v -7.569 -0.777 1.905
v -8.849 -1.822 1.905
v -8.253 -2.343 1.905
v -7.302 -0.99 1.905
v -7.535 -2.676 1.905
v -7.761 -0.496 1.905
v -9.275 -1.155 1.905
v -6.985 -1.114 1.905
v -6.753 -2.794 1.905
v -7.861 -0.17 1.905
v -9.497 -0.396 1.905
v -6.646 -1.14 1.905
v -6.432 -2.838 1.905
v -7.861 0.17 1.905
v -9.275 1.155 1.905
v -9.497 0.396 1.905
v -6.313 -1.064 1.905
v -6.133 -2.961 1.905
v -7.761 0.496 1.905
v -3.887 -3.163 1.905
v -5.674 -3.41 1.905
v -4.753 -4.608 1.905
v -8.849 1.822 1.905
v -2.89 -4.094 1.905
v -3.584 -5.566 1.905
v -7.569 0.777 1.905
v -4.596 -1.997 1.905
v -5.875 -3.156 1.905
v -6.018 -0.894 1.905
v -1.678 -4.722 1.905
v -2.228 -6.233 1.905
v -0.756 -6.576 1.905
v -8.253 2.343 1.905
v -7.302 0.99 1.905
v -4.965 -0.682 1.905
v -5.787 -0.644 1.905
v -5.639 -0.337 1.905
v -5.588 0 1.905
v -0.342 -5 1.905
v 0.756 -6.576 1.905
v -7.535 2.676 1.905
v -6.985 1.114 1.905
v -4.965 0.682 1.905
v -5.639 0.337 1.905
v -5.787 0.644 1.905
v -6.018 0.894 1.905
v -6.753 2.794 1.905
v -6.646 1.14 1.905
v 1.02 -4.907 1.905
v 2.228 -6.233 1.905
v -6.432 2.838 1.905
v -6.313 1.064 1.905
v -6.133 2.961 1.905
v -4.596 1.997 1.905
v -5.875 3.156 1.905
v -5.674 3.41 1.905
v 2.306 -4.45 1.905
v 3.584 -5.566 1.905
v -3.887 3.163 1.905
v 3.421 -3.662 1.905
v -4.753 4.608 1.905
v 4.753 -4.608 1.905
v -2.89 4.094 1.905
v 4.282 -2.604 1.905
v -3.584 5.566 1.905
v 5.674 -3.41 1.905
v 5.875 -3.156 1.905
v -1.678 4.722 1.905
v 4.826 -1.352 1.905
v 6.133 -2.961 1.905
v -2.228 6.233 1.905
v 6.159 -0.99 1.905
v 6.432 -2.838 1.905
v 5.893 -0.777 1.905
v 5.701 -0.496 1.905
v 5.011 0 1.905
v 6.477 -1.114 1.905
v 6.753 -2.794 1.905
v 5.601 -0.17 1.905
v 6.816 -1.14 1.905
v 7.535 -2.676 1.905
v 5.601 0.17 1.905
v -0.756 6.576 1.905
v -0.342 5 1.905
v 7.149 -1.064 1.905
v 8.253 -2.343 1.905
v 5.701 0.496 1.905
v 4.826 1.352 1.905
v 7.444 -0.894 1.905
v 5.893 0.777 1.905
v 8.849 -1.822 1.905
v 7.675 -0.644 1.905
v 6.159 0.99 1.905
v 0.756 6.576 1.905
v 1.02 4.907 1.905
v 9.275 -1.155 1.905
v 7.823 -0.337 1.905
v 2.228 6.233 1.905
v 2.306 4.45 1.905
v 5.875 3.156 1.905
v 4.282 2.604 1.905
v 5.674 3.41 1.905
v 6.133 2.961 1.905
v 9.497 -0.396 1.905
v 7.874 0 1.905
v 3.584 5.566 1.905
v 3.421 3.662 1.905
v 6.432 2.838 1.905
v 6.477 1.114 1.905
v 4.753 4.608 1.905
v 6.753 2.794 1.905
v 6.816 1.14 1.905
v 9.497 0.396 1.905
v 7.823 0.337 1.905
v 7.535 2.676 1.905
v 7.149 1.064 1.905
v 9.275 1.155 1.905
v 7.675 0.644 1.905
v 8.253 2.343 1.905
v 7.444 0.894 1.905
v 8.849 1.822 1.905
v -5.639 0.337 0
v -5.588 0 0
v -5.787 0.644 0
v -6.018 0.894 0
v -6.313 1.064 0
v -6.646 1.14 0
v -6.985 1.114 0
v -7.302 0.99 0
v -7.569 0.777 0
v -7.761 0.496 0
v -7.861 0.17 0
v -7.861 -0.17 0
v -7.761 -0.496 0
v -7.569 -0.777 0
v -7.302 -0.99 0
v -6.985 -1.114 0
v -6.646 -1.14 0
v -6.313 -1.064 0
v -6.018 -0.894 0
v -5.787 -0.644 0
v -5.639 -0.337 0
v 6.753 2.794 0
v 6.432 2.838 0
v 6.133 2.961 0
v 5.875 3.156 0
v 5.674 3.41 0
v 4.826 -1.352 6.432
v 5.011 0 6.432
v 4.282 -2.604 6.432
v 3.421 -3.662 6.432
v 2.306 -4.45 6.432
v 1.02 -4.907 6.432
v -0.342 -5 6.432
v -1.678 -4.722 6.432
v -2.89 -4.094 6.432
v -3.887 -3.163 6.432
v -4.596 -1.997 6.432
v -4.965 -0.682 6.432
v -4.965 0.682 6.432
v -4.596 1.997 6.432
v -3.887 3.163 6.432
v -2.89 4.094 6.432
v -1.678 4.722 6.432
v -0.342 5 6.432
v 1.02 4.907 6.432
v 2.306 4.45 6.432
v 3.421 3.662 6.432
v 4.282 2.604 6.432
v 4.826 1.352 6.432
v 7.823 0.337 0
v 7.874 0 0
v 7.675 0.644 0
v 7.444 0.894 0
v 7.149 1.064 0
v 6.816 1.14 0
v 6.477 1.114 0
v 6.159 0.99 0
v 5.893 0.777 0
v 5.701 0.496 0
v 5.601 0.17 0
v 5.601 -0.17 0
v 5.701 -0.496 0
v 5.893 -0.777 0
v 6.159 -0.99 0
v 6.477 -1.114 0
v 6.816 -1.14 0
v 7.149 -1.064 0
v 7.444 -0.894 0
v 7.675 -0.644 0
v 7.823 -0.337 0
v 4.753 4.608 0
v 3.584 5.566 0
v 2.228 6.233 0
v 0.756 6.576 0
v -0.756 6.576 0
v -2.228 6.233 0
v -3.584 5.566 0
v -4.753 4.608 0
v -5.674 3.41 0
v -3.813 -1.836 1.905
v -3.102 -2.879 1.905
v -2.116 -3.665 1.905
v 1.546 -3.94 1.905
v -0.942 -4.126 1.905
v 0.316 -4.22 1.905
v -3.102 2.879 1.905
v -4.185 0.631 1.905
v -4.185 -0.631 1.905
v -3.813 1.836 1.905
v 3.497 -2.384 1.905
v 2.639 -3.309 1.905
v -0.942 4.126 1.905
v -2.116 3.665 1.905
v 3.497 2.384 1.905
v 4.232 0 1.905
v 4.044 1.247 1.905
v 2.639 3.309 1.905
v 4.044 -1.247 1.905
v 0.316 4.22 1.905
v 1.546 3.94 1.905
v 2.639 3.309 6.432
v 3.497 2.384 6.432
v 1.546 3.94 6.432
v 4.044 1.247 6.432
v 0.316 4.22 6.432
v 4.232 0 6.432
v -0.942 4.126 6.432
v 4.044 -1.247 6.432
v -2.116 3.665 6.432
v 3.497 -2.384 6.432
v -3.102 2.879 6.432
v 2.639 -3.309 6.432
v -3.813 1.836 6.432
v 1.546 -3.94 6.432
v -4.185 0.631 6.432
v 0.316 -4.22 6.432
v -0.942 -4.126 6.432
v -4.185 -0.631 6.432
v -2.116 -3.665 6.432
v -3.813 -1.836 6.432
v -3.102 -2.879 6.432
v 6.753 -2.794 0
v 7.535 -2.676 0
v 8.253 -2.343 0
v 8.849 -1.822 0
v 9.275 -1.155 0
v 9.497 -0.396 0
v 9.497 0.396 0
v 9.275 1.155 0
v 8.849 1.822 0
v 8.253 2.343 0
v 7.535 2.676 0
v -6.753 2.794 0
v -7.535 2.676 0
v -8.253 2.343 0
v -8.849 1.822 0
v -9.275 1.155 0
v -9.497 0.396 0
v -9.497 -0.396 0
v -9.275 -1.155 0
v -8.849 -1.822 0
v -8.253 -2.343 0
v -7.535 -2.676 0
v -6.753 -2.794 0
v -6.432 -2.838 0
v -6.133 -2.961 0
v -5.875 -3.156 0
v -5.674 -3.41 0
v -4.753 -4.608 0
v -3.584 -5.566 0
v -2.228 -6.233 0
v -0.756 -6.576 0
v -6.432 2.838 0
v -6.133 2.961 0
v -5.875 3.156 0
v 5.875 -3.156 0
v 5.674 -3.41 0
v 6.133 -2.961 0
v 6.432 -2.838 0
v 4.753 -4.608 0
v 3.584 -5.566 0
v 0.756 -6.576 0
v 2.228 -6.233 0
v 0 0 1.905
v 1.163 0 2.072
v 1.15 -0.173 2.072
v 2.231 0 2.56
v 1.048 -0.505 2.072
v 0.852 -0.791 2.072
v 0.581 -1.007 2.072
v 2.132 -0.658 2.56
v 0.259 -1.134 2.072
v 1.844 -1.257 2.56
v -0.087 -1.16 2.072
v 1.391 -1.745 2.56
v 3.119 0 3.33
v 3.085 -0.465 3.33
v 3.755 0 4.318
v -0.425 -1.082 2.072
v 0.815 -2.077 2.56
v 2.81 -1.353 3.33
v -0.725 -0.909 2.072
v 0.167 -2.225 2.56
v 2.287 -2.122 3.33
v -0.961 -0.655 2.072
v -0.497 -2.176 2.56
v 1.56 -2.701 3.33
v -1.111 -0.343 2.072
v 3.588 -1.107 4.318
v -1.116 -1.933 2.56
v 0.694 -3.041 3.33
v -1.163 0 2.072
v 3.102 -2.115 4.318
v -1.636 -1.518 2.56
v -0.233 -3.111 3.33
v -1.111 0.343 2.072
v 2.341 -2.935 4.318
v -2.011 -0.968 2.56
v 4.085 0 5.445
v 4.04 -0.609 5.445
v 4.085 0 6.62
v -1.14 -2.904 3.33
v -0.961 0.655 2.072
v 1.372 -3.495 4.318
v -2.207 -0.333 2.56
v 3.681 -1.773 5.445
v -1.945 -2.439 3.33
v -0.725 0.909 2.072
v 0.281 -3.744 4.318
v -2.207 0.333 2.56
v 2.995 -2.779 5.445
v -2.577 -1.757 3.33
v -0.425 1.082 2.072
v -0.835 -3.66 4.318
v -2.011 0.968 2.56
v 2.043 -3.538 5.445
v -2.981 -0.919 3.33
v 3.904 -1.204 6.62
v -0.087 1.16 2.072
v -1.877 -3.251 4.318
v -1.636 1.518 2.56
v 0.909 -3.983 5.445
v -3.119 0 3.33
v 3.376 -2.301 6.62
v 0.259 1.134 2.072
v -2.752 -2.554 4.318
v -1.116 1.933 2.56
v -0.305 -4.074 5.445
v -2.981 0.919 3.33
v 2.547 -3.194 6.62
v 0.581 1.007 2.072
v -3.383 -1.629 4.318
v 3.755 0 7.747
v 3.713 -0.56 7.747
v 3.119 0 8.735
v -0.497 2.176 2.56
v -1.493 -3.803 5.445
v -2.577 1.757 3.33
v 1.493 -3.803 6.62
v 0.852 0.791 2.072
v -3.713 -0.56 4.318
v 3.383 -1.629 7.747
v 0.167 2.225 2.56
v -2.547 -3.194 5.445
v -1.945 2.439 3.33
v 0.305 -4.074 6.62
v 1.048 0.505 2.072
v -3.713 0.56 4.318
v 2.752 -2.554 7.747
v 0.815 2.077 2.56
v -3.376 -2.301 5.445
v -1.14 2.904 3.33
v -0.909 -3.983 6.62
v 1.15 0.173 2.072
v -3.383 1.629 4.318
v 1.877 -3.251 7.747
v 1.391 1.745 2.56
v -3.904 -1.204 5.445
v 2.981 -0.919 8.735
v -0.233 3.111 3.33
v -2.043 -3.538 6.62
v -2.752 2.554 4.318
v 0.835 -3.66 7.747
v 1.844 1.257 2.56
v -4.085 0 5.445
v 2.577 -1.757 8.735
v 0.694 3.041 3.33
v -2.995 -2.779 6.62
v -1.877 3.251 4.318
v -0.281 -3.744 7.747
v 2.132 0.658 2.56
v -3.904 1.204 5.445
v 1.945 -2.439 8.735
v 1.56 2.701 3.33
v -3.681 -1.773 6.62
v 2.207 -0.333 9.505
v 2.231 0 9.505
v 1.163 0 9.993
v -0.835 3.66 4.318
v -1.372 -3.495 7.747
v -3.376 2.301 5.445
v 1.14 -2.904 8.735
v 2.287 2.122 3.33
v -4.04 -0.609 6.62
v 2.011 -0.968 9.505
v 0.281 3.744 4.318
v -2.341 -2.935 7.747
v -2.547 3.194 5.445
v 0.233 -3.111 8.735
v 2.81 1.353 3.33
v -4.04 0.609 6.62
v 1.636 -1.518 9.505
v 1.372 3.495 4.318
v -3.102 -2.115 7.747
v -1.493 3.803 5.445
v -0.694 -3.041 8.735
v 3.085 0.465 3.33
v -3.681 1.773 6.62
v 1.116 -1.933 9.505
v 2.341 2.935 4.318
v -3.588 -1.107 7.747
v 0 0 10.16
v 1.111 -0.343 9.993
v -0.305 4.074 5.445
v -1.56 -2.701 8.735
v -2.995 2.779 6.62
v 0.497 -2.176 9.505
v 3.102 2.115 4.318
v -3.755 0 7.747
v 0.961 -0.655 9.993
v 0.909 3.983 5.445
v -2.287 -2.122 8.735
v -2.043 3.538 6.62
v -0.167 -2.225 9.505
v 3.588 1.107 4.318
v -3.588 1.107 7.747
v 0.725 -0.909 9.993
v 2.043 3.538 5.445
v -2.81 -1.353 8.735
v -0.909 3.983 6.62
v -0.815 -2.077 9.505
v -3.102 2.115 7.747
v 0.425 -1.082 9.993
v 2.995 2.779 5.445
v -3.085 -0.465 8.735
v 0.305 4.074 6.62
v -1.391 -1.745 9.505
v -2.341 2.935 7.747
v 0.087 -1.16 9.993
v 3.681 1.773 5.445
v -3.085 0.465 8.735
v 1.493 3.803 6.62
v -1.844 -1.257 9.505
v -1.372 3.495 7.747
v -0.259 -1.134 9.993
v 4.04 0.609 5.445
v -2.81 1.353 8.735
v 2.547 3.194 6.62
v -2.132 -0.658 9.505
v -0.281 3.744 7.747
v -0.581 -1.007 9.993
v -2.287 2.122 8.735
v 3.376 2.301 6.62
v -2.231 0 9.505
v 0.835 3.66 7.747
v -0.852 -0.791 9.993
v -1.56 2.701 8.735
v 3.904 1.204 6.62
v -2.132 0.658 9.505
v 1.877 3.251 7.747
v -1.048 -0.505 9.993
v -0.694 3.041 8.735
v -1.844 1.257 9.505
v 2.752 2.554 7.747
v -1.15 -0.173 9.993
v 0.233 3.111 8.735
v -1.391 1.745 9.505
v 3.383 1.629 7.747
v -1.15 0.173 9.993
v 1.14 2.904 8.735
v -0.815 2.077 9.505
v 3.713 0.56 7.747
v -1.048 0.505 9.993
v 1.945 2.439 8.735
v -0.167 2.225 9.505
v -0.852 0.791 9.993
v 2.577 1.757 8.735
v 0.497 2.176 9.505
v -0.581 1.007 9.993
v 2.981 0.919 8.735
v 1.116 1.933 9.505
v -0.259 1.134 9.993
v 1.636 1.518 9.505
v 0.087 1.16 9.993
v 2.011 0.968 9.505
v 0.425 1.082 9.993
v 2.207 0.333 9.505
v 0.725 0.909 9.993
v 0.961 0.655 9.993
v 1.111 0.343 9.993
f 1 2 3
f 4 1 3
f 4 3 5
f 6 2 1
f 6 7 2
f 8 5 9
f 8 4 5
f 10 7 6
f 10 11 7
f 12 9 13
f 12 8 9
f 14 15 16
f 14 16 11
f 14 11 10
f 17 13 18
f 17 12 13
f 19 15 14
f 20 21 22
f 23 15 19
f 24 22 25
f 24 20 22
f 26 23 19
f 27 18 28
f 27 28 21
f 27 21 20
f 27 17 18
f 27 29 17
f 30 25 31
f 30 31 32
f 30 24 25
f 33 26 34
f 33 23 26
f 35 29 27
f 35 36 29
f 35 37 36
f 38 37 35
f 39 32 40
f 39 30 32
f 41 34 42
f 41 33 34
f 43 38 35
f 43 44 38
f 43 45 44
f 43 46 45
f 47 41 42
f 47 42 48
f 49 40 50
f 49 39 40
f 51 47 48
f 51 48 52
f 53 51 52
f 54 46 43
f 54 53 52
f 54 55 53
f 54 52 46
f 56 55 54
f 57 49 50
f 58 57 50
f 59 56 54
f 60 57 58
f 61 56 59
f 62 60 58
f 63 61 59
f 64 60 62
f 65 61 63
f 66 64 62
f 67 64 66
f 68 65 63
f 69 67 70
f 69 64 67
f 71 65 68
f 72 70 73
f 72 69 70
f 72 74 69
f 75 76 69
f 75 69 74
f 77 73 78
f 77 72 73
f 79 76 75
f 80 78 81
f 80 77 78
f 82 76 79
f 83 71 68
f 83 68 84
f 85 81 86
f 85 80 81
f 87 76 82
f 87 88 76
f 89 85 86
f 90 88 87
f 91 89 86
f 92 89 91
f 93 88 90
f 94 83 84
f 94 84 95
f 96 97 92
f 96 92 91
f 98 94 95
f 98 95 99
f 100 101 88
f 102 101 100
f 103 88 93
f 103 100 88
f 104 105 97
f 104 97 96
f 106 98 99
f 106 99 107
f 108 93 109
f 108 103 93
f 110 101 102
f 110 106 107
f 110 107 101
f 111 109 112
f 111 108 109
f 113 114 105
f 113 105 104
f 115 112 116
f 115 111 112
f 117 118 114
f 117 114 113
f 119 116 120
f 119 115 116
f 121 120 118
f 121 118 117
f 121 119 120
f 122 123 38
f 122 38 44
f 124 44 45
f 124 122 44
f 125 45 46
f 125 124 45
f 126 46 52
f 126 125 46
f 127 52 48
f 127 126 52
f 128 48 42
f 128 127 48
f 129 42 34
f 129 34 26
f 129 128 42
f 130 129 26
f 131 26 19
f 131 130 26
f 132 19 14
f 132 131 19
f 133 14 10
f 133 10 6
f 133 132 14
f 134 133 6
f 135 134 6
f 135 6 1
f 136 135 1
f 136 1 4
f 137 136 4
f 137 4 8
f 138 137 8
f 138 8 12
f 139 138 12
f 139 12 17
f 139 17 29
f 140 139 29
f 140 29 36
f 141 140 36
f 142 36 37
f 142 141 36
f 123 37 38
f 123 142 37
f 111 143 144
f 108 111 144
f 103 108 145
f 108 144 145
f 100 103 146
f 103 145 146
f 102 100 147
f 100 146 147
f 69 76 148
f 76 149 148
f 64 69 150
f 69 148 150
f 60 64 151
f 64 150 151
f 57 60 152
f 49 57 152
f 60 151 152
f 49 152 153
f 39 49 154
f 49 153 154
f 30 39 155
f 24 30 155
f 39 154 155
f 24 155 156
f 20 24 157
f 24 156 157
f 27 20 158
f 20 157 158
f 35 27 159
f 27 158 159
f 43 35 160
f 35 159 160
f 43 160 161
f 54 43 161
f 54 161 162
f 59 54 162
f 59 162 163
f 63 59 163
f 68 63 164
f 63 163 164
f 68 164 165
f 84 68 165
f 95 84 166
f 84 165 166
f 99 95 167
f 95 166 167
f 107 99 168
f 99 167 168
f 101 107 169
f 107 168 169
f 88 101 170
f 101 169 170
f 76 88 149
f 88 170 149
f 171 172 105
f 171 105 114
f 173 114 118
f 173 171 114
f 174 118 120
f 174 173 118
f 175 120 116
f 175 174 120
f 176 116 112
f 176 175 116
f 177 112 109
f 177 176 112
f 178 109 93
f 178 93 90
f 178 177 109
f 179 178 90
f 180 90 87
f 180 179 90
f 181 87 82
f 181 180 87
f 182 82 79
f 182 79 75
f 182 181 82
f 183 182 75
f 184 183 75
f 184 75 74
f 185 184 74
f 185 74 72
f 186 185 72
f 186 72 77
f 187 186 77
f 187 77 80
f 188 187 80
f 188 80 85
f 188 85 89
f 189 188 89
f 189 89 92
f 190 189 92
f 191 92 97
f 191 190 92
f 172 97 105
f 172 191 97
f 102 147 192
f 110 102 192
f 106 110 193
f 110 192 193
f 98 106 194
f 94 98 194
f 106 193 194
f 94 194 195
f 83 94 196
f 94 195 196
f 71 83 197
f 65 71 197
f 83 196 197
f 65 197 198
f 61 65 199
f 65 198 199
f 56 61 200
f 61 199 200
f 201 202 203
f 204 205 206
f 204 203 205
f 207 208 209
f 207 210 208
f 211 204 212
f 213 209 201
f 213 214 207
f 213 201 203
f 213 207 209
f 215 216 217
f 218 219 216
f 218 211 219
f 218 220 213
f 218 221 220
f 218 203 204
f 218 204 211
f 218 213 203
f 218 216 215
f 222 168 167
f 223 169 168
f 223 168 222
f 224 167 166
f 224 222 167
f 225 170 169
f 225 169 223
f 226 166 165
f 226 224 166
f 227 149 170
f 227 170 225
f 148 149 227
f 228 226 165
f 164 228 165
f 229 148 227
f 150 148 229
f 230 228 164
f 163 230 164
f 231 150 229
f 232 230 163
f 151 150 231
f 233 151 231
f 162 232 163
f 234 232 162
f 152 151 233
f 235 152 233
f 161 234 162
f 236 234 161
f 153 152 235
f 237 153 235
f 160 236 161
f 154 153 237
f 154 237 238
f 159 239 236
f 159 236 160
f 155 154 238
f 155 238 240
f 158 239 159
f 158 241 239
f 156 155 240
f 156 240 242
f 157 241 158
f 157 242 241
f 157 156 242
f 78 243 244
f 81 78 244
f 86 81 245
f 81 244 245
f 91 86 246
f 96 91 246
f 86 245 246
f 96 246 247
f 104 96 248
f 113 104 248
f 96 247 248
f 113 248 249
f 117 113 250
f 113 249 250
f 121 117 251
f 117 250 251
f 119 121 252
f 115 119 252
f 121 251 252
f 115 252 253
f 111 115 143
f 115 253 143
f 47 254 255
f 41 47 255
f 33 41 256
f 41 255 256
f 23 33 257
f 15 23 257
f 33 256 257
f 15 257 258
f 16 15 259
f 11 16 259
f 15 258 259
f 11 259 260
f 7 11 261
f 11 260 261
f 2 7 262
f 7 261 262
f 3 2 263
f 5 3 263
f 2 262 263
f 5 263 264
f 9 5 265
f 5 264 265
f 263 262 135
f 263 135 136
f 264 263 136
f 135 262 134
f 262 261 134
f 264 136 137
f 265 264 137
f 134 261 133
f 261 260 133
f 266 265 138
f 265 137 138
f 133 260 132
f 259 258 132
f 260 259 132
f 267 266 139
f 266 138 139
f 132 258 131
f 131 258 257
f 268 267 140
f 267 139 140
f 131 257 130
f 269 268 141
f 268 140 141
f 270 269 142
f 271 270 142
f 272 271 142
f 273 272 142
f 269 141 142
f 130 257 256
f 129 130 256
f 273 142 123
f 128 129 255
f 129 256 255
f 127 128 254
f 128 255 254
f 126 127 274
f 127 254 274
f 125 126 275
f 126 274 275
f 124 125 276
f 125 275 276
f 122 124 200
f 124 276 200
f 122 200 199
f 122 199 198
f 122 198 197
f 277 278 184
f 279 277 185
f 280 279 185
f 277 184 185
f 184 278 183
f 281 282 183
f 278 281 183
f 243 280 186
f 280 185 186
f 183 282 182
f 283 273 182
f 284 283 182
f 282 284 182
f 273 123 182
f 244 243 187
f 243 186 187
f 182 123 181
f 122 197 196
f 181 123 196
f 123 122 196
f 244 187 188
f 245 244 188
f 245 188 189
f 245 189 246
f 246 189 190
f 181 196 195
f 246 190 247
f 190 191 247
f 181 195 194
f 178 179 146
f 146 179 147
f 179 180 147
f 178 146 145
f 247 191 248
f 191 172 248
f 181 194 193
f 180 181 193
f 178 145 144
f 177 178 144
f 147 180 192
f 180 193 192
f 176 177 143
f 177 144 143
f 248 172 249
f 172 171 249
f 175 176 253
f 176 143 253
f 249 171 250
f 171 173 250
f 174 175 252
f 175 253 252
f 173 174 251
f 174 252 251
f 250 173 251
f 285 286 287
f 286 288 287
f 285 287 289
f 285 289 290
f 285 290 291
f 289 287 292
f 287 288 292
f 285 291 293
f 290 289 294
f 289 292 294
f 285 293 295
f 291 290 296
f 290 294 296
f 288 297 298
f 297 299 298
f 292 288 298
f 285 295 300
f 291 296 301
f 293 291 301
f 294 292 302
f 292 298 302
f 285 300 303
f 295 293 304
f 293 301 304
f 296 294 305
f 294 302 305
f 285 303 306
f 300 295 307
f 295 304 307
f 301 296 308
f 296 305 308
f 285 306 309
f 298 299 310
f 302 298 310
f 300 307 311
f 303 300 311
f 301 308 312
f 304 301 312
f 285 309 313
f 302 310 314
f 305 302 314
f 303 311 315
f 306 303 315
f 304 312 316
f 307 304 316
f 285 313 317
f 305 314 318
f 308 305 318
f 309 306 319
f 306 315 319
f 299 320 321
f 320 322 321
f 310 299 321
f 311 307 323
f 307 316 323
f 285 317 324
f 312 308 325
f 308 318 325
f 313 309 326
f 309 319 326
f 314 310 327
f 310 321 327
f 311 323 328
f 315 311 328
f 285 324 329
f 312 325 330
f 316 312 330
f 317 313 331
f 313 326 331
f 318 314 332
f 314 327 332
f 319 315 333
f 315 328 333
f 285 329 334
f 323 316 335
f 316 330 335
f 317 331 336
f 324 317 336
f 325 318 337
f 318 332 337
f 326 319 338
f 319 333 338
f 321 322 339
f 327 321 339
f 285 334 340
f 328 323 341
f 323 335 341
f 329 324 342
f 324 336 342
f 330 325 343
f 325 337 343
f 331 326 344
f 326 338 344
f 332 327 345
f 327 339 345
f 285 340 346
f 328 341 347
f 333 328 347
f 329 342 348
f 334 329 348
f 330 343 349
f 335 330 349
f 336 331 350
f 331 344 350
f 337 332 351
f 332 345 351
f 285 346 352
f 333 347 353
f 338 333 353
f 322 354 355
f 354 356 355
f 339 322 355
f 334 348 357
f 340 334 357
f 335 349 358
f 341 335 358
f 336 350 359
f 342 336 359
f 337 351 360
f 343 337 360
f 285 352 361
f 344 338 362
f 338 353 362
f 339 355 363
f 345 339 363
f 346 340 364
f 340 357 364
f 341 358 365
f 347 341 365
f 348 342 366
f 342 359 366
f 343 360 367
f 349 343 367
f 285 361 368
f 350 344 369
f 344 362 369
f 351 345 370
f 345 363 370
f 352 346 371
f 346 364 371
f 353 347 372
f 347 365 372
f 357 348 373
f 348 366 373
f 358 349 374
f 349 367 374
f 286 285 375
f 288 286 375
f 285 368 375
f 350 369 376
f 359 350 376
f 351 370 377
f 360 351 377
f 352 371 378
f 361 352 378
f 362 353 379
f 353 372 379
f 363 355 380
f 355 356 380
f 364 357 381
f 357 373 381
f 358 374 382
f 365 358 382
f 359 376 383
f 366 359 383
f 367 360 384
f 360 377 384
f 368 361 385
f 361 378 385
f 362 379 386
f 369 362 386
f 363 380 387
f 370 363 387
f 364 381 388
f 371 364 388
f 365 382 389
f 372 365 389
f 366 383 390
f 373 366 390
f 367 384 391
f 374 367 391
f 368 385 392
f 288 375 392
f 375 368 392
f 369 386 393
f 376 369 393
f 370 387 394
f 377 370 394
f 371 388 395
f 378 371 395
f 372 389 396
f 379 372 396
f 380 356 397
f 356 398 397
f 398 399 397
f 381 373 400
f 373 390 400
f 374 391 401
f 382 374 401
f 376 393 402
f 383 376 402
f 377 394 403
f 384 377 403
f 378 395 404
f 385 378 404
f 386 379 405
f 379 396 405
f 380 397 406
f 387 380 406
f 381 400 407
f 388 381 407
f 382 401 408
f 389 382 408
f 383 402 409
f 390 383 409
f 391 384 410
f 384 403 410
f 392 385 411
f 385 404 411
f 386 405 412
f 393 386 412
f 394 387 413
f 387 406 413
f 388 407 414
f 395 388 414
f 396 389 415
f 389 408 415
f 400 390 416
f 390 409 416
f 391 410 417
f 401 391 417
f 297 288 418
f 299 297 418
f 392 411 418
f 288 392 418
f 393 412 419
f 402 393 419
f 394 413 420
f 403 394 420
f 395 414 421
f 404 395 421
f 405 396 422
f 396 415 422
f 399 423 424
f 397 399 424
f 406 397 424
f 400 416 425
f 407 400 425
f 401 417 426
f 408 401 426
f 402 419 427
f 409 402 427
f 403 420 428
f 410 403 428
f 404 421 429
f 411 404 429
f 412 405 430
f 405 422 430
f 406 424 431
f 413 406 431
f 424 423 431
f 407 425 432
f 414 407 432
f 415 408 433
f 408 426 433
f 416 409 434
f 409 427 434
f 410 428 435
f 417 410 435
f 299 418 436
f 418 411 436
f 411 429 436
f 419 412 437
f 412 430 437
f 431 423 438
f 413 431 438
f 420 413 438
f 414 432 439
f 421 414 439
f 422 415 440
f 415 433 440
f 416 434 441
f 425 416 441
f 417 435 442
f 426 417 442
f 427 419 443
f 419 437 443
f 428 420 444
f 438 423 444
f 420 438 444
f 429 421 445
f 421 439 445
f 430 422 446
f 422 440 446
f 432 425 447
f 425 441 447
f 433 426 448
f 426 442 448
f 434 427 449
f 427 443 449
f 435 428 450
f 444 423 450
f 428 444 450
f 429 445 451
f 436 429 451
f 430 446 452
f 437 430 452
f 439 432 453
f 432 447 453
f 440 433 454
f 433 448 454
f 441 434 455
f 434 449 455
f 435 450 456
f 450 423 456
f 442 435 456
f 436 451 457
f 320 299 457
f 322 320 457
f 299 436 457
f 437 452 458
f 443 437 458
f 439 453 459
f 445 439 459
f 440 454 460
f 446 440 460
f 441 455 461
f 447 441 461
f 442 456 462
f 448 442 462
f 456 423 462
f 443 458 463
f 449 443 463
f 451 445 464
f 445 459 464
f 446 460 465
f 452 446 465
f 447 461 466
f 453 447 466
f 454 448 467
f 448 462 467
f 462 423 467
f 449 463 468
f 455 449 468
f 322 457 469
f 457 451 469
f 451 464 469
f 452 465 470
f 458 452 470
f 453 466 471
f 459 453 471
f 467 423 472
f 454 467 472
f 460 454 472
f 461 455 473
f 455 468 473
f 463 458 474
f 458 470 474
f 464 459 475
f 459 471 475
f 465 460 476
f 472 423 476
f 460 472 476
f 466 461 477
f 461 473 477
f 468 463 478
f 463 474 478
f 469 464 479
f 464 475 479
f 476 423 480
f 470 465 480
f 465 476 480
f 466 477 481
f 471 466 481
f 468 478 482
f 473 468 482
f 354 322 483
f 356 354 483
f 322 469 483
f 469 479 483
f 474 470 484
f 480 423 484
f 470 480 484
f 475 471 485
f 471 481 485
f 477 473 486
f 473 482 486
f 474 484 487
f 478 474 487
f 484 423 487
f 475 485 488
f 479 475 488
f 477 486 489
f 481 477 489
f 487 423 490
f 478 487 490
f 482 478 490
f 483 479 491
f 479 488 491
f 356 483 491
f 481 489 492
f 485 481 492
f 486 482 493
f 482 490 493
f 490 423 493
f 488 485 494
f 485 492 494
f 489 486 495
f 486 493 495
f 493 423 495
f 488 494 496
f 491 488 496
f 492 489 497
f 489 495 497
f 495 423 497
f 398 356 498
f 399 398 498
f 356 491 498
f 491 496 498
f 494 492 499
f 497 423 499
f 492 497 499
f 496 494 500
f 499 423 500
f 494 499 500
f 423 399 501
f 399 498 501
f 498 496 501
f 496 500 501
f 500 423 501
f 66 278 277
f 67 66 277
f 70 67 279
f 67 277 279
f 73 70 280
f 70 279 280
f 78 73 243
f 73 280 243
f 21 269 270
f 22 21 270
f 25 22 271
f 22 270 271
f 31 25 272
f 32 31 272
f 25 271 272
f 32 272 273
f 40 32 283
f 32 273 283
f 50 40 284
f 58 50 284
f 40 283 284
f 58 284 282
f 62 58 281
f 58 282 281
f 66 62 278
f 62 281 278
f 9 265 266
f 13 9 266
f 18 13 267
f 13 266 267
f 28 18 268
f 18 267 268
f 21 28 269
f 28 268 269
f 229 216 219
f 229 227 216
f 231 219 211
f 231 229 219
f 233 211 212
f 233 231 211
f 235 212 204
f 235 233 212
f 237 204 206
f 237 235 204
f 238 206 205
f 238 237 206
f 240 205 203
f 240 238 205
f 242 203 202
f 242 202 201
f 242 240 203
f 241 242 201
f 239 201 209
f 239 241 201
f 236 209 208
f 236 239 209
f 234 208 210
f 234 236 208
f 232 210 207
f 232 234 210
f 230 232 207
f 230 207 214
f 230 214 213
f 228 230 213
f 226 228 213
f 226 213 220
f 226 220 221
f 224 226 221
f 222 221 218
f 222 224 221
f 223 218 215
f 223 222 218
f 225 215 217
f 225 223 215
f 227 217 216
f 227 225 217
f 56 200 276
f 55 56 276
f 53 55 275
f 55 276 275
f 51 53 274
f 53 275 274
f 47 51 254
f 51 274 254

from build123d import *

# Parameters (mm, degrees)
F0_R     = 1.143
F1_DEPTH = 1.905
F4_W     = 0.779254
F4_H     = 4.527096


with BuildPart() as f1:
    # F0 (on Top) → F1 (new body)
    with BuildSketch(Plane.XY):
        with BuildLine():
            ThreePointArc((-6.752613, -2.793916), (-6.132824, -2.960933), (-5.673877, -3.409709))
            ThreePointArc((-5.673877, -3.409709), (0, -6.619592), (5.673877, -3.409709))
            ThreePointArc((5.673877, -3.409709), (6.132824, -2.960933), (6.752613, -2.793916))
            ThreePointArc((6.752613, -2.793916), (9.525, 0), (6.752613, 2.793916))
            ThreePointArc((6.752613, 2.793916), (6.132824, 2.960933), (5.673877, 3.409709))
            ThreePointArc((5.673877, 3.409709), (0, 6.619592), (-5.673877, 3.409709))
            ThreePointArc((-5.673877, 3.409709), (-6.132824, 2.960933), (-6.752613, 2.793916))
            ThreePointArc((-6.752613, 2.793916), (-9.525, 0), (-6.752613, -2.793916))
        make_face()
        with Locations((-6.731, 0)):
            Circle(F0_R, mode=Mode.SUBTRACT)
        with Locations((6.731, 0)):
            Circle(F0_R, mode=Mode.SUBTRACT)
    extrude(amount=F1_DEPTH)

    # F4 (on Front) → F5 (revolve)
    with BuildSketch(Plane.XZ):
        with Locations((4.621729, 4.168548)):
            Rectangle(F4_W, F4_H)
    revolve(axis=Axis((0, 0, 4.886028), (0, 0, -1)))


with BuildPart() as f3:
    # F2 (on Front) → F3 (revolve)
    with BuildSketch(Plane.XZ):
        with BuildLine():
            ThreePointArc((0, 1.905), (4.1275, 6.0325), (0, 10.16))
            Line((0, 10.16), (0, 1.905))
        make_face()
    revolve(axis=Axis((0, 0, 6.0325), (0, 0, -1)))


solid = Compound([f1.part, f3.part])
